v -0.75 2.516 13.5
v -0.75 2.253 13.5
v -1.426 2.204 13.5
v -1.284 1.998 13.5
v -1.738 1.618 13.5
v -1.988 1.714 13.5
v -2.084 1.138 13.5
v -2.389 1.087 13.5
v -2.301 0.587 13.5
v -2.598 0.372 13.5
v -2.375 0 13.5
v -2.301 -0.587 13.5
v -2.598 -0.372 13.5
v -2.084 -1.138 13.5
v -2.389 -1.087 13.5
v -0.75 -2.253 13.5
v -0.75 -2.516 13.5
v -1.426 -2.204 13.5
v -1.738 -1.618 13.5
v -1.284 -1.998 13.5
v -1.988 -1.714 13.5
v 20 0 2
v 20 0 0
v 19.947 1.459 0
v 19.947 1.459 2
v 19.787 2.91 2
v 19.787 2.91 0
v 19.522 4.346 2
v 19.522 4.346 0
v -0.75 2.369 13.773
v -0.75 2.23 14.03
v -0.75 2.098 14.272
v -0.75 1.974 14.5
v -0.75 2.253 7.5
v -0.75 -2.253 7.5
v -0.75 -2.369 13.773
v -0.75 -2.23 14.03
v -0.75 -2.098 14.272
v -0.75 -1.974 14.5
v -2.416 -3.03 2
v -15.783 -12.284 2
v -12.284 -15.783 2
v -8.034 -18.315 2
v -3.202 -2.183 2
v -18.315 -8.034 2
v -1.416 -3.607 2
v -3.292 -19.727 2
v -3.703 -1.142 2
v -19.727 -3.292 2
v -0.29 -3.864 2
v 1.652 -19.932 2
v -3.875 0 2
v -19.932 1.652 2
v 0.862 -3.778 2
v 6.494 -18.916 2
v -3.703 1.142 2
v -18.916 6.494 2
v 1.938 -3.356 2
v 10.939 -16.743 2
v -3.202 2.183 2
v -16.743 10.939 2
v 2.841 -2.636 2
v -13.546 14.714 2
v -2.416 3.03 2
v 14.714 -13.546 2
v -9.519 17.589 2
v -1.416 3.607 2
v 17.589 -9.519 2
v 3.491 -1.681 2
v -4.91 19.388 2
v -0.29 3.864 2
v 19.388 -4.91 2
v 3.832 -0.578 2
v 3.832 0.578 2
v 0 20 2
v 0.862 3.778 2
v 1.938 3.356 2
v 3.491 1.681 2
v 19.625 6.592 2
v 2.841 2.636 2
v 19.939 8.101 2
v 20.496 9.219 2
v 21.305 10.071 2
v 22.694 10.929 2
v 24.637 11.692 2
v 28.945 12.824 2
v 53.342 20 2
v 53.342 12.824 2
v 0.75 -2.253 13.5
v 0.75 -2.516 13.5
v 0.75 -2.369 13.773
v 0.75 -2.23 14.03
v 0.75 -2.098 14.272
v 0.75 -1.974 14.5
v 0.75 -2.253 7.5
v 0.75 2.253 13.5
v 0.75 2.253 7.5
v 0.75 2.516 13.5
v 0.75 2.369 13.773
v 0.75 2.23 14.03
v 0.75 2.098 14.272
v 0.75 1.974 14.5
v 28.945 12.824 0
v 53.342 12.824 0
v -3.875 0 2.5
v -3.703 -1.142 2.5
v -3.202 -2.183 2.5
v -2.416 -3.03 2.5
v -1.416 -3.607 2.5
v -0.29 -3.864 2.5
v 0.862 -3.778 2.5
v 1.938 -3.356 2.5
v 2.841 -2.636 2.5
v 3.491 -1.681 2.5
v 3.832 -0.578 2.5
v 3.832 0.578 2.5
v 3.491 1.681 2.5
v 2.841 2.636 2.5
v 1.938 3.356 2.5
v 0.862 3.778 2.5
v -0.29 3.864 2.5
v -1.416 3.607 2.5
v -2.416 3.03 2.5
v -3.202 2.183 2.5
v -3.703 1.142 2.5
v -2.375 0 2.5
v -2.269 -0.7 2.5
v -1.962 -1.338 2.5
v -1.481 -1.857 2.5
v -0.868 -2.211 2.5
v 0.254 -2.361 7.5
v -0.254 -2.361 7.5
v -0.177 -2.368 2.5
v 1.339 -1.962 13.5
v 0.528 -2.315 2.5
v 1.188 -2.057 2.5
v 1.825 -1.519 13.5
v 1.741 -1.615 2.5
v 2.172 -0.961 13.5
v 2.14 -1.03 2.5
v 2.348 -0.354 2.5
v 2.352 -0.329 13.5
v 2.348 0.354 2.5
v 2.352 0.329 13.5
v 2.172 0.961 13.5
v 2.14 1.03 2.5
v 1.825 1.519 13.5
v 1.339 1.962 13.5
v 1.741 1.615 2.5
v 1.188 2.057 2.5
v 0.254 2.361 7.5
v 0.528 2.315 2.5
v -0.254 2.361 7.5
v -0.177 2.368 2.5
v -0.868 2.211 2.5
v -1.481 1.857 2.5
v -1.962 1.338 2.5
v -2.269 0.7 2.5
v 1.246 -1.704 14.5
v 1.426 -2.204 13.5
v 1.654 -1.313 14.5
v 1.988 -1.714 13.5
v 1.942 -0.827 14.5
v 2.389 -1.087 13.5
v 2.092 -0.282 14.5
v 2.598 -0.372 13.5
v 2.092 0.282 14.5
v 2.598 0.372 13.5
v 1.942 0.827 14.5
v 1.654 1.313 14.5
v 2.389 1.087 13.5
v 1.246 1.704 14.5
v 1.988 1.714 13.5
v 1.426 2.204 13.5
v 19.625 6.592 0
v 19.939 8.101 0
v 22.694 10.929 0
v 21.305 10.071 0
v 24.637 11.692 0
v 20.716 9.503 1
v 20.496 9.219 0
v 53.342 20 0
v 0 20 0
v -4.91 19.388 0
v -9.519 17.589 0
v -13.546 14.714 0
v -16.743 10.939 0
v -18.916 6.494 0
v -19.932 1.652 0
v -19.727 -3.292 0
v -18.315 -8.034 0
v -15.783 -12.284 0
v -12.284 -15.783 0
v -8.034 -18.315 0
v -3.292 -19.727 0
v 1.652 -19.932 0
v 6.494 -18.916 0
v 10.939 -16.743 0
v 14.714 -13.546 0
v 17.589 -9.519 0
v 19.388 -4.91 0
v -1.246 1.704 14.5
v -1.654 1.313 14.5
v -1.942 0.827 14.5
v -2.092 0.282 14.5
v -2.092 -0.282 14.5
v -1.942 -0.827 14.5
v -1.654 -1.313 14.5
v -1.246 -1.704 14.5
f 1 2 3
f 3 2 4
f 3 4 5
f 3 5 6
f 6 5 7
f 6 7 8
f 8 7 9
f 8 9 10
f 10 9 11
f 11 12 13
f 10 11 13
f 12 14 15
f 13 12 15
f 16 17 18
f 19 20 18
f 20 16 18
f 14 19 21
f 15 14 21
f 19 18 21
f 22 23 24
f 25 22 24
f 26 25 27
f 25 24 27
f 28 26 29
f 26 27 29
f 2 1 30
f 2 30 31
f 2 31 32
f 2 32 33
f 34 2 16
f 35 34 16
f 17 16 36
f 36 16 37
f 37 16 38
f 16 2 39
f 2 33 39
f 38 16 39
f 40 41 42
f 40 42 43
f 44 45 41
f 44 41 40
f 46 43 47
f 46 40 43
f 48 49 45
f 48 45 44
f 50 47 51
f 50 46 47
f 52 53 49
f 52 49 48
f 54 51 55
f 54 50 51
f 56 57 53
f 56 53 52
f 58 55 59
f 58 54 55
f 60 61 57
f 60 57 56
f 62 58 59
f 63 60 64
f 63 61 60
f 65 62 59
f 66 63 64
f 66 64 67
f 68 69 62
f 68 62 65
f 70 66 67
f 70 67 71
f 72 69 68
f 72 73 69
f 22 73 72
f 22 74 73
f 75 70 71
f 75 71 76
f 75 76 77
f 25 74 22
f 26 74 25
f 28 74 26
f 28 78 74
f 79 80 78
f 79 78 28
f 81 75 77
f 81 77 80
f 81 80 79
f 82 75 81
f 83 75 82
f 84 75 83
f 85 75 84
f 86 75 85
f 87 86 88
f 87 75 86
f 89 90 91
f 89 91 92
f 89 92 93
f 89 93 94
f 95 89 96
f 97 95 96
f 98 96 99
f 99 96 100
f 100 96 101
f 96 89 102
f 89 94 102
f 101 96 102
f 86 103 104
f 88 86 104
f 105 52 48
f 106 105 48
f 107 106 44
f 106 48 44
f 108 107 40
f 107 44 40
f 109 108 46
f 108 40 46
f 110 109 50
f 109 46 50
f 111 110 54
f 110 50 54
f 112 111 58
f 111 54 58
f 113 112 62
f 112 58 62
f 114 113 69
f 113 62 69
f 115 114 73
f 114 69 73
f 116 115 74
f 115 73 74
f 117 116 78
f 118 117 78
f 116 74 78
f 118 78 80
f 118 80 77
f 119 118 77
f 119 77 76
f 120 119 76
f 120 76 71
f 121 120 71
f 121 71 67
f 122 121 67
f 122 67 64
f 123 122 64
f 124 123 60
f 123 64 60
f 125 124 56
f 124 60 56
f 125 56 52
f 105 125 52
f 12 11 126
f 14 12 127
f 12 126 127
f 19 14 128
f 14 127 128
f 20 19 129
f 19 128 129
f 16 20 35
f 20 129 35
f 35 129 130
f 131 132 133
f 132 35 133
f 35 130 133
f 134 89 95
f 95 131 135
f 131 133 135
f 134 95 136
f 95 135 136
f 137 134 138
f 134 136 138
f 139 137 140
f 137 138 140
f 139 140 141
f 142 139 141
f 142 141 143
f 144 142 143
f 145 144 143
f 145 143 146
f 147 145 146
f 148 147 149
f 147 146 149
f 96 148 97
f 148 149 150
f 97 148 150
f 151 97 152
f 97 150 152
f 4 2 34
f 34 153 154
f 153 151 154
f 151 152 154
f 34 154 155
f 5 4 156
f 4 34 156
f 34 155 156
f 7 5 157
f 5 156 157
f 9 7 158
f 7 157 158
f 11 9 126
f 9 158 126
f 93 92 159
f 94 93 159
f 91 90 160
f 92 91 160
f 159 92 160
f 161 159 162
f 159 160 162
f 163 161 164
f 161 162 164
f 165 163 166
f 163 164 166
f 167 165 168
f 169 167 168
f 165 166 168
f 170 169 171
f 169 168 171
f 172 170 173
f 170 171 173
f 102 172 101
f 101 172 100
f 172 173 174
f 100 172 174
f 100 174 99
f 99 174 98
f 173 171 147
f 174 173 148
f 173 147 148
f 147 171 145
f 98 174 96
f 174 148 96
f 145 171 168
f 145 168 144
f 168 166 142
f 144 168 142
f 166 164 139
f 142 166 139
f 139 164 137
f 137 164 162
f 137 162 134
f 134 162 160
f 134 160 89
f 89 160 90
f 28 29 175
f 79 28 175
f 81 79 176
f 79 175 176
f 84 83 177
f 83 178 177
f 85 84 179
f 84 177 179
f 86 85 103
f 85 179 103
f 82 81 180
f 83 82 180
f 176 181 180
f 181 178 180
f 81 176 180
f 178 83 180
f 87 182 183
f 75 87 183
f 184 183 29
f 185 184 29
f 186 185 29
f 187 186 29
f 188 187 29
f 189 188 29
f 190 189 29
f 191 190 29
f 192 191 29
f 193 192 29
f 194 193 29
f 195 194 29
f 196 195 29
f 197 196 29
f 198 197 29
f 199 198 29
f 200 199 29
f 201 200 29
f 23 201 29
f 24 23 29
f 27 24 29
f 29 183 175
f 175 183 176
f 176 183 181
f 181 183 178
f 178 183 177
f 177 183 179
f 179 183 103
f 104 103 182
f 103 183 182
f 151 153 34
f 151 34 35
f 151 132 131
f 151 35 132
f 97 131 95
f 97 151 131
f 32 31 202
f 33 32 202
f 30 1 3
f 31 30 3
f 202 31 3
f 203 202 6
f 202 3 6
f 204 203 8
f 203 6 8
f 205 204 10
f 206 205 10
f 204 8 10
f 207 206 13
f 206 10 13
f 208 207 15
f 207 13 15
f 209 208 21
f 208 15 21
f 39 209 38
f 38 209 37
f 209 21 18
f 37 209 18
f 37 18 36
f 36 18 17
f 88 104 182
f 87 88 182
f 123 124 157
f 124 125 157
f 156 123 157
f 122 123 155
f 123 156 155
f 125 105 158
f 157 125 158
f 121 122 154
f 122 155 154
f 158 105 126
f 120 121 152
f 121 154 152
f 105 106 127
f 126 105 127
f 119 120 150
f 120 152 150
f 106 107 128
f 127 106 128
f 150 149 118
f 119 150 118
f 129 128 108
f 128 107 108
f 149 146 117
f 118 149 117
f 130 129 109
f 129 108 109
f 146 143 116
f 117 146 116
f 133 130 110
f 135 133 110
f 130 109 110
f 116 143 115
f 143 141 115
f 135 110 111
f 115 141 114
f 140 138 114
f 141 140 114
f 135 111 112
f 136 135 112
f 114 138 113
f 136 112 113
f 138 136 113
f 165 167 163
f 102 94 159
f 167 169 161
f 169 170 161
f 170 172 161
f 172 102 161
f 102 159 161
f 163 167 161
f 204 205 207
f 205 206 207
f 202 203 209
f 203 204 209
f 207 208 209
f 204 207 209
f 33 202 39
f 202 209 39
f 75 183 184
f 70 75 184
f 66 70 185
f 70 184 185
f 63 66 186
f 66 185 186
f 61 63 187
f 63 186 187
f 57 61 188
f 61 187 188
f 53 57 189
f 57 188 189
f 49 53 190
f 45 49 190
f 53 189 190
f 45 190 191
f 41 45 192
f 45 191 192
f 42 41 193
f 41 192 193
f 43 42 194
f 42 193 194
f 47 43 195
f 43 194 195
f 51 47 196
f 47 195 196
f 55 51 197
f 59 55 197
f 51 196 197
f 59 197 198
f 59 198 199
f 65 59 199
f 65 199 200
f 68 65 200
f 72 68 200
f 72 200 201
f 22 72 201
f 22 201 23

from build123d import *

# Parameters (mm, degrees)
F1_DEPTH = 2
F5_DEPTH = 7


with BuildPart() as f1:
    # F0 (on Top) → F1 (new body)
    with BuildSketch(Plane.XY):
        with BuildLine():
            ThreePointArc((0, 20), (-14.1421356237, -14.1421356237), (20, 0))
            ThreePointArc((20, 0), (19.8801750957, 2.1860096442), (19.5221361835, 4.3458254488))
            ThreePointArc((19.5221361835, 4.3458254488), (12.5116643782, 15.6031488645), (0, 20))
        make_face()
        with BuildLine():
            ThreePointArc((0, 20), (12.5116643782, 15.6031488645), (19.5221361835, 4.3458254488))
            add(Edge.make_bspline(
                [(19.5221361835, 4.3458254488), (19.5522097075, 6.2540398569), (19.5931412655, 10.6298460328), (25.5746730025, 12.0320439415), (28.9447810501, 12.8235351294)],
                knots=[0, 0, 0, 0, 0.4357911991, 1, 1, 1, 1], degree=3))
            Line((28.9447810501, 12.8235351294), (53.3421300352, 12.8235351294))
            Line((53.3421300352, 12.8235351294), (53.3421300352, 20))
            Line((53.3421300352, 20), (0, 20))
        make_face()
    extrude(amount=F1_DEPTH)

    # F2 (on Front) → F3 (revolve)
    with BuildSketch(Plane.XZ):
        Polygon((-2.375, 0), (0, 0), (0, 14.5), (-2.1112329669, 14.5), (-2.625, 13.5), (-2.375, 13.5), (-2.375, 2.5), (-3.875, 2.5), (-3.875, 0), align=None)
    revolve(axis=Axis((0, 0, 6.1913983081), (0, 0, 1)))

    # F4 (on face) → F5 (cut)
    with BuildSketch(Plane.XY.offset(14.5)):
        with BuildLine():
            ThreePointArc((-0.75, 1.9735259412), (0, 2.1112329669), (0.75, 1.9735259412))
            Line((0.75, 1.9735259412), (0.75, 4.4615390464))
            Line((0.75, 4.4615390464), (-0.75, 4.4615390464))
            Line((-0.75, 4.4615390464), (-0.75, 1.9735259412))
        make_face()
        with BuildLine():
            ThreePointArc((-0.75, -1.9735259412), (0, -2.1112329669), (0.75, -1.9735259412))
            Line((0.75, -1.9735259412), (0.75, 1.9735259412))
            ThreePointArc((0.75, 1.9735259412), (0, 2.1112329669), (-0.75, 1.9735259412))
            Line((-0.75, 1.9735259412), (-0.75, -1.9735259412))
        make_face()
        with BuildLine():
            Line((-0.75, -4.4615390464), (0.75, -4.4615390464))
            Line((0.75, -4.4615390464), (0.75, -1.9735259412))
            ThreePointArc((0.75, -1.9735259412), (0, -2.1112329669), (-0.75, -1.9735259412))
            Line((-0.75, -1.9735259412), (-0.75, -4.4615390464))
        make_face()
    extrude(amount=-F5_DEPTH, mode=Mode.SUBTRACT)


solid = f1.part
